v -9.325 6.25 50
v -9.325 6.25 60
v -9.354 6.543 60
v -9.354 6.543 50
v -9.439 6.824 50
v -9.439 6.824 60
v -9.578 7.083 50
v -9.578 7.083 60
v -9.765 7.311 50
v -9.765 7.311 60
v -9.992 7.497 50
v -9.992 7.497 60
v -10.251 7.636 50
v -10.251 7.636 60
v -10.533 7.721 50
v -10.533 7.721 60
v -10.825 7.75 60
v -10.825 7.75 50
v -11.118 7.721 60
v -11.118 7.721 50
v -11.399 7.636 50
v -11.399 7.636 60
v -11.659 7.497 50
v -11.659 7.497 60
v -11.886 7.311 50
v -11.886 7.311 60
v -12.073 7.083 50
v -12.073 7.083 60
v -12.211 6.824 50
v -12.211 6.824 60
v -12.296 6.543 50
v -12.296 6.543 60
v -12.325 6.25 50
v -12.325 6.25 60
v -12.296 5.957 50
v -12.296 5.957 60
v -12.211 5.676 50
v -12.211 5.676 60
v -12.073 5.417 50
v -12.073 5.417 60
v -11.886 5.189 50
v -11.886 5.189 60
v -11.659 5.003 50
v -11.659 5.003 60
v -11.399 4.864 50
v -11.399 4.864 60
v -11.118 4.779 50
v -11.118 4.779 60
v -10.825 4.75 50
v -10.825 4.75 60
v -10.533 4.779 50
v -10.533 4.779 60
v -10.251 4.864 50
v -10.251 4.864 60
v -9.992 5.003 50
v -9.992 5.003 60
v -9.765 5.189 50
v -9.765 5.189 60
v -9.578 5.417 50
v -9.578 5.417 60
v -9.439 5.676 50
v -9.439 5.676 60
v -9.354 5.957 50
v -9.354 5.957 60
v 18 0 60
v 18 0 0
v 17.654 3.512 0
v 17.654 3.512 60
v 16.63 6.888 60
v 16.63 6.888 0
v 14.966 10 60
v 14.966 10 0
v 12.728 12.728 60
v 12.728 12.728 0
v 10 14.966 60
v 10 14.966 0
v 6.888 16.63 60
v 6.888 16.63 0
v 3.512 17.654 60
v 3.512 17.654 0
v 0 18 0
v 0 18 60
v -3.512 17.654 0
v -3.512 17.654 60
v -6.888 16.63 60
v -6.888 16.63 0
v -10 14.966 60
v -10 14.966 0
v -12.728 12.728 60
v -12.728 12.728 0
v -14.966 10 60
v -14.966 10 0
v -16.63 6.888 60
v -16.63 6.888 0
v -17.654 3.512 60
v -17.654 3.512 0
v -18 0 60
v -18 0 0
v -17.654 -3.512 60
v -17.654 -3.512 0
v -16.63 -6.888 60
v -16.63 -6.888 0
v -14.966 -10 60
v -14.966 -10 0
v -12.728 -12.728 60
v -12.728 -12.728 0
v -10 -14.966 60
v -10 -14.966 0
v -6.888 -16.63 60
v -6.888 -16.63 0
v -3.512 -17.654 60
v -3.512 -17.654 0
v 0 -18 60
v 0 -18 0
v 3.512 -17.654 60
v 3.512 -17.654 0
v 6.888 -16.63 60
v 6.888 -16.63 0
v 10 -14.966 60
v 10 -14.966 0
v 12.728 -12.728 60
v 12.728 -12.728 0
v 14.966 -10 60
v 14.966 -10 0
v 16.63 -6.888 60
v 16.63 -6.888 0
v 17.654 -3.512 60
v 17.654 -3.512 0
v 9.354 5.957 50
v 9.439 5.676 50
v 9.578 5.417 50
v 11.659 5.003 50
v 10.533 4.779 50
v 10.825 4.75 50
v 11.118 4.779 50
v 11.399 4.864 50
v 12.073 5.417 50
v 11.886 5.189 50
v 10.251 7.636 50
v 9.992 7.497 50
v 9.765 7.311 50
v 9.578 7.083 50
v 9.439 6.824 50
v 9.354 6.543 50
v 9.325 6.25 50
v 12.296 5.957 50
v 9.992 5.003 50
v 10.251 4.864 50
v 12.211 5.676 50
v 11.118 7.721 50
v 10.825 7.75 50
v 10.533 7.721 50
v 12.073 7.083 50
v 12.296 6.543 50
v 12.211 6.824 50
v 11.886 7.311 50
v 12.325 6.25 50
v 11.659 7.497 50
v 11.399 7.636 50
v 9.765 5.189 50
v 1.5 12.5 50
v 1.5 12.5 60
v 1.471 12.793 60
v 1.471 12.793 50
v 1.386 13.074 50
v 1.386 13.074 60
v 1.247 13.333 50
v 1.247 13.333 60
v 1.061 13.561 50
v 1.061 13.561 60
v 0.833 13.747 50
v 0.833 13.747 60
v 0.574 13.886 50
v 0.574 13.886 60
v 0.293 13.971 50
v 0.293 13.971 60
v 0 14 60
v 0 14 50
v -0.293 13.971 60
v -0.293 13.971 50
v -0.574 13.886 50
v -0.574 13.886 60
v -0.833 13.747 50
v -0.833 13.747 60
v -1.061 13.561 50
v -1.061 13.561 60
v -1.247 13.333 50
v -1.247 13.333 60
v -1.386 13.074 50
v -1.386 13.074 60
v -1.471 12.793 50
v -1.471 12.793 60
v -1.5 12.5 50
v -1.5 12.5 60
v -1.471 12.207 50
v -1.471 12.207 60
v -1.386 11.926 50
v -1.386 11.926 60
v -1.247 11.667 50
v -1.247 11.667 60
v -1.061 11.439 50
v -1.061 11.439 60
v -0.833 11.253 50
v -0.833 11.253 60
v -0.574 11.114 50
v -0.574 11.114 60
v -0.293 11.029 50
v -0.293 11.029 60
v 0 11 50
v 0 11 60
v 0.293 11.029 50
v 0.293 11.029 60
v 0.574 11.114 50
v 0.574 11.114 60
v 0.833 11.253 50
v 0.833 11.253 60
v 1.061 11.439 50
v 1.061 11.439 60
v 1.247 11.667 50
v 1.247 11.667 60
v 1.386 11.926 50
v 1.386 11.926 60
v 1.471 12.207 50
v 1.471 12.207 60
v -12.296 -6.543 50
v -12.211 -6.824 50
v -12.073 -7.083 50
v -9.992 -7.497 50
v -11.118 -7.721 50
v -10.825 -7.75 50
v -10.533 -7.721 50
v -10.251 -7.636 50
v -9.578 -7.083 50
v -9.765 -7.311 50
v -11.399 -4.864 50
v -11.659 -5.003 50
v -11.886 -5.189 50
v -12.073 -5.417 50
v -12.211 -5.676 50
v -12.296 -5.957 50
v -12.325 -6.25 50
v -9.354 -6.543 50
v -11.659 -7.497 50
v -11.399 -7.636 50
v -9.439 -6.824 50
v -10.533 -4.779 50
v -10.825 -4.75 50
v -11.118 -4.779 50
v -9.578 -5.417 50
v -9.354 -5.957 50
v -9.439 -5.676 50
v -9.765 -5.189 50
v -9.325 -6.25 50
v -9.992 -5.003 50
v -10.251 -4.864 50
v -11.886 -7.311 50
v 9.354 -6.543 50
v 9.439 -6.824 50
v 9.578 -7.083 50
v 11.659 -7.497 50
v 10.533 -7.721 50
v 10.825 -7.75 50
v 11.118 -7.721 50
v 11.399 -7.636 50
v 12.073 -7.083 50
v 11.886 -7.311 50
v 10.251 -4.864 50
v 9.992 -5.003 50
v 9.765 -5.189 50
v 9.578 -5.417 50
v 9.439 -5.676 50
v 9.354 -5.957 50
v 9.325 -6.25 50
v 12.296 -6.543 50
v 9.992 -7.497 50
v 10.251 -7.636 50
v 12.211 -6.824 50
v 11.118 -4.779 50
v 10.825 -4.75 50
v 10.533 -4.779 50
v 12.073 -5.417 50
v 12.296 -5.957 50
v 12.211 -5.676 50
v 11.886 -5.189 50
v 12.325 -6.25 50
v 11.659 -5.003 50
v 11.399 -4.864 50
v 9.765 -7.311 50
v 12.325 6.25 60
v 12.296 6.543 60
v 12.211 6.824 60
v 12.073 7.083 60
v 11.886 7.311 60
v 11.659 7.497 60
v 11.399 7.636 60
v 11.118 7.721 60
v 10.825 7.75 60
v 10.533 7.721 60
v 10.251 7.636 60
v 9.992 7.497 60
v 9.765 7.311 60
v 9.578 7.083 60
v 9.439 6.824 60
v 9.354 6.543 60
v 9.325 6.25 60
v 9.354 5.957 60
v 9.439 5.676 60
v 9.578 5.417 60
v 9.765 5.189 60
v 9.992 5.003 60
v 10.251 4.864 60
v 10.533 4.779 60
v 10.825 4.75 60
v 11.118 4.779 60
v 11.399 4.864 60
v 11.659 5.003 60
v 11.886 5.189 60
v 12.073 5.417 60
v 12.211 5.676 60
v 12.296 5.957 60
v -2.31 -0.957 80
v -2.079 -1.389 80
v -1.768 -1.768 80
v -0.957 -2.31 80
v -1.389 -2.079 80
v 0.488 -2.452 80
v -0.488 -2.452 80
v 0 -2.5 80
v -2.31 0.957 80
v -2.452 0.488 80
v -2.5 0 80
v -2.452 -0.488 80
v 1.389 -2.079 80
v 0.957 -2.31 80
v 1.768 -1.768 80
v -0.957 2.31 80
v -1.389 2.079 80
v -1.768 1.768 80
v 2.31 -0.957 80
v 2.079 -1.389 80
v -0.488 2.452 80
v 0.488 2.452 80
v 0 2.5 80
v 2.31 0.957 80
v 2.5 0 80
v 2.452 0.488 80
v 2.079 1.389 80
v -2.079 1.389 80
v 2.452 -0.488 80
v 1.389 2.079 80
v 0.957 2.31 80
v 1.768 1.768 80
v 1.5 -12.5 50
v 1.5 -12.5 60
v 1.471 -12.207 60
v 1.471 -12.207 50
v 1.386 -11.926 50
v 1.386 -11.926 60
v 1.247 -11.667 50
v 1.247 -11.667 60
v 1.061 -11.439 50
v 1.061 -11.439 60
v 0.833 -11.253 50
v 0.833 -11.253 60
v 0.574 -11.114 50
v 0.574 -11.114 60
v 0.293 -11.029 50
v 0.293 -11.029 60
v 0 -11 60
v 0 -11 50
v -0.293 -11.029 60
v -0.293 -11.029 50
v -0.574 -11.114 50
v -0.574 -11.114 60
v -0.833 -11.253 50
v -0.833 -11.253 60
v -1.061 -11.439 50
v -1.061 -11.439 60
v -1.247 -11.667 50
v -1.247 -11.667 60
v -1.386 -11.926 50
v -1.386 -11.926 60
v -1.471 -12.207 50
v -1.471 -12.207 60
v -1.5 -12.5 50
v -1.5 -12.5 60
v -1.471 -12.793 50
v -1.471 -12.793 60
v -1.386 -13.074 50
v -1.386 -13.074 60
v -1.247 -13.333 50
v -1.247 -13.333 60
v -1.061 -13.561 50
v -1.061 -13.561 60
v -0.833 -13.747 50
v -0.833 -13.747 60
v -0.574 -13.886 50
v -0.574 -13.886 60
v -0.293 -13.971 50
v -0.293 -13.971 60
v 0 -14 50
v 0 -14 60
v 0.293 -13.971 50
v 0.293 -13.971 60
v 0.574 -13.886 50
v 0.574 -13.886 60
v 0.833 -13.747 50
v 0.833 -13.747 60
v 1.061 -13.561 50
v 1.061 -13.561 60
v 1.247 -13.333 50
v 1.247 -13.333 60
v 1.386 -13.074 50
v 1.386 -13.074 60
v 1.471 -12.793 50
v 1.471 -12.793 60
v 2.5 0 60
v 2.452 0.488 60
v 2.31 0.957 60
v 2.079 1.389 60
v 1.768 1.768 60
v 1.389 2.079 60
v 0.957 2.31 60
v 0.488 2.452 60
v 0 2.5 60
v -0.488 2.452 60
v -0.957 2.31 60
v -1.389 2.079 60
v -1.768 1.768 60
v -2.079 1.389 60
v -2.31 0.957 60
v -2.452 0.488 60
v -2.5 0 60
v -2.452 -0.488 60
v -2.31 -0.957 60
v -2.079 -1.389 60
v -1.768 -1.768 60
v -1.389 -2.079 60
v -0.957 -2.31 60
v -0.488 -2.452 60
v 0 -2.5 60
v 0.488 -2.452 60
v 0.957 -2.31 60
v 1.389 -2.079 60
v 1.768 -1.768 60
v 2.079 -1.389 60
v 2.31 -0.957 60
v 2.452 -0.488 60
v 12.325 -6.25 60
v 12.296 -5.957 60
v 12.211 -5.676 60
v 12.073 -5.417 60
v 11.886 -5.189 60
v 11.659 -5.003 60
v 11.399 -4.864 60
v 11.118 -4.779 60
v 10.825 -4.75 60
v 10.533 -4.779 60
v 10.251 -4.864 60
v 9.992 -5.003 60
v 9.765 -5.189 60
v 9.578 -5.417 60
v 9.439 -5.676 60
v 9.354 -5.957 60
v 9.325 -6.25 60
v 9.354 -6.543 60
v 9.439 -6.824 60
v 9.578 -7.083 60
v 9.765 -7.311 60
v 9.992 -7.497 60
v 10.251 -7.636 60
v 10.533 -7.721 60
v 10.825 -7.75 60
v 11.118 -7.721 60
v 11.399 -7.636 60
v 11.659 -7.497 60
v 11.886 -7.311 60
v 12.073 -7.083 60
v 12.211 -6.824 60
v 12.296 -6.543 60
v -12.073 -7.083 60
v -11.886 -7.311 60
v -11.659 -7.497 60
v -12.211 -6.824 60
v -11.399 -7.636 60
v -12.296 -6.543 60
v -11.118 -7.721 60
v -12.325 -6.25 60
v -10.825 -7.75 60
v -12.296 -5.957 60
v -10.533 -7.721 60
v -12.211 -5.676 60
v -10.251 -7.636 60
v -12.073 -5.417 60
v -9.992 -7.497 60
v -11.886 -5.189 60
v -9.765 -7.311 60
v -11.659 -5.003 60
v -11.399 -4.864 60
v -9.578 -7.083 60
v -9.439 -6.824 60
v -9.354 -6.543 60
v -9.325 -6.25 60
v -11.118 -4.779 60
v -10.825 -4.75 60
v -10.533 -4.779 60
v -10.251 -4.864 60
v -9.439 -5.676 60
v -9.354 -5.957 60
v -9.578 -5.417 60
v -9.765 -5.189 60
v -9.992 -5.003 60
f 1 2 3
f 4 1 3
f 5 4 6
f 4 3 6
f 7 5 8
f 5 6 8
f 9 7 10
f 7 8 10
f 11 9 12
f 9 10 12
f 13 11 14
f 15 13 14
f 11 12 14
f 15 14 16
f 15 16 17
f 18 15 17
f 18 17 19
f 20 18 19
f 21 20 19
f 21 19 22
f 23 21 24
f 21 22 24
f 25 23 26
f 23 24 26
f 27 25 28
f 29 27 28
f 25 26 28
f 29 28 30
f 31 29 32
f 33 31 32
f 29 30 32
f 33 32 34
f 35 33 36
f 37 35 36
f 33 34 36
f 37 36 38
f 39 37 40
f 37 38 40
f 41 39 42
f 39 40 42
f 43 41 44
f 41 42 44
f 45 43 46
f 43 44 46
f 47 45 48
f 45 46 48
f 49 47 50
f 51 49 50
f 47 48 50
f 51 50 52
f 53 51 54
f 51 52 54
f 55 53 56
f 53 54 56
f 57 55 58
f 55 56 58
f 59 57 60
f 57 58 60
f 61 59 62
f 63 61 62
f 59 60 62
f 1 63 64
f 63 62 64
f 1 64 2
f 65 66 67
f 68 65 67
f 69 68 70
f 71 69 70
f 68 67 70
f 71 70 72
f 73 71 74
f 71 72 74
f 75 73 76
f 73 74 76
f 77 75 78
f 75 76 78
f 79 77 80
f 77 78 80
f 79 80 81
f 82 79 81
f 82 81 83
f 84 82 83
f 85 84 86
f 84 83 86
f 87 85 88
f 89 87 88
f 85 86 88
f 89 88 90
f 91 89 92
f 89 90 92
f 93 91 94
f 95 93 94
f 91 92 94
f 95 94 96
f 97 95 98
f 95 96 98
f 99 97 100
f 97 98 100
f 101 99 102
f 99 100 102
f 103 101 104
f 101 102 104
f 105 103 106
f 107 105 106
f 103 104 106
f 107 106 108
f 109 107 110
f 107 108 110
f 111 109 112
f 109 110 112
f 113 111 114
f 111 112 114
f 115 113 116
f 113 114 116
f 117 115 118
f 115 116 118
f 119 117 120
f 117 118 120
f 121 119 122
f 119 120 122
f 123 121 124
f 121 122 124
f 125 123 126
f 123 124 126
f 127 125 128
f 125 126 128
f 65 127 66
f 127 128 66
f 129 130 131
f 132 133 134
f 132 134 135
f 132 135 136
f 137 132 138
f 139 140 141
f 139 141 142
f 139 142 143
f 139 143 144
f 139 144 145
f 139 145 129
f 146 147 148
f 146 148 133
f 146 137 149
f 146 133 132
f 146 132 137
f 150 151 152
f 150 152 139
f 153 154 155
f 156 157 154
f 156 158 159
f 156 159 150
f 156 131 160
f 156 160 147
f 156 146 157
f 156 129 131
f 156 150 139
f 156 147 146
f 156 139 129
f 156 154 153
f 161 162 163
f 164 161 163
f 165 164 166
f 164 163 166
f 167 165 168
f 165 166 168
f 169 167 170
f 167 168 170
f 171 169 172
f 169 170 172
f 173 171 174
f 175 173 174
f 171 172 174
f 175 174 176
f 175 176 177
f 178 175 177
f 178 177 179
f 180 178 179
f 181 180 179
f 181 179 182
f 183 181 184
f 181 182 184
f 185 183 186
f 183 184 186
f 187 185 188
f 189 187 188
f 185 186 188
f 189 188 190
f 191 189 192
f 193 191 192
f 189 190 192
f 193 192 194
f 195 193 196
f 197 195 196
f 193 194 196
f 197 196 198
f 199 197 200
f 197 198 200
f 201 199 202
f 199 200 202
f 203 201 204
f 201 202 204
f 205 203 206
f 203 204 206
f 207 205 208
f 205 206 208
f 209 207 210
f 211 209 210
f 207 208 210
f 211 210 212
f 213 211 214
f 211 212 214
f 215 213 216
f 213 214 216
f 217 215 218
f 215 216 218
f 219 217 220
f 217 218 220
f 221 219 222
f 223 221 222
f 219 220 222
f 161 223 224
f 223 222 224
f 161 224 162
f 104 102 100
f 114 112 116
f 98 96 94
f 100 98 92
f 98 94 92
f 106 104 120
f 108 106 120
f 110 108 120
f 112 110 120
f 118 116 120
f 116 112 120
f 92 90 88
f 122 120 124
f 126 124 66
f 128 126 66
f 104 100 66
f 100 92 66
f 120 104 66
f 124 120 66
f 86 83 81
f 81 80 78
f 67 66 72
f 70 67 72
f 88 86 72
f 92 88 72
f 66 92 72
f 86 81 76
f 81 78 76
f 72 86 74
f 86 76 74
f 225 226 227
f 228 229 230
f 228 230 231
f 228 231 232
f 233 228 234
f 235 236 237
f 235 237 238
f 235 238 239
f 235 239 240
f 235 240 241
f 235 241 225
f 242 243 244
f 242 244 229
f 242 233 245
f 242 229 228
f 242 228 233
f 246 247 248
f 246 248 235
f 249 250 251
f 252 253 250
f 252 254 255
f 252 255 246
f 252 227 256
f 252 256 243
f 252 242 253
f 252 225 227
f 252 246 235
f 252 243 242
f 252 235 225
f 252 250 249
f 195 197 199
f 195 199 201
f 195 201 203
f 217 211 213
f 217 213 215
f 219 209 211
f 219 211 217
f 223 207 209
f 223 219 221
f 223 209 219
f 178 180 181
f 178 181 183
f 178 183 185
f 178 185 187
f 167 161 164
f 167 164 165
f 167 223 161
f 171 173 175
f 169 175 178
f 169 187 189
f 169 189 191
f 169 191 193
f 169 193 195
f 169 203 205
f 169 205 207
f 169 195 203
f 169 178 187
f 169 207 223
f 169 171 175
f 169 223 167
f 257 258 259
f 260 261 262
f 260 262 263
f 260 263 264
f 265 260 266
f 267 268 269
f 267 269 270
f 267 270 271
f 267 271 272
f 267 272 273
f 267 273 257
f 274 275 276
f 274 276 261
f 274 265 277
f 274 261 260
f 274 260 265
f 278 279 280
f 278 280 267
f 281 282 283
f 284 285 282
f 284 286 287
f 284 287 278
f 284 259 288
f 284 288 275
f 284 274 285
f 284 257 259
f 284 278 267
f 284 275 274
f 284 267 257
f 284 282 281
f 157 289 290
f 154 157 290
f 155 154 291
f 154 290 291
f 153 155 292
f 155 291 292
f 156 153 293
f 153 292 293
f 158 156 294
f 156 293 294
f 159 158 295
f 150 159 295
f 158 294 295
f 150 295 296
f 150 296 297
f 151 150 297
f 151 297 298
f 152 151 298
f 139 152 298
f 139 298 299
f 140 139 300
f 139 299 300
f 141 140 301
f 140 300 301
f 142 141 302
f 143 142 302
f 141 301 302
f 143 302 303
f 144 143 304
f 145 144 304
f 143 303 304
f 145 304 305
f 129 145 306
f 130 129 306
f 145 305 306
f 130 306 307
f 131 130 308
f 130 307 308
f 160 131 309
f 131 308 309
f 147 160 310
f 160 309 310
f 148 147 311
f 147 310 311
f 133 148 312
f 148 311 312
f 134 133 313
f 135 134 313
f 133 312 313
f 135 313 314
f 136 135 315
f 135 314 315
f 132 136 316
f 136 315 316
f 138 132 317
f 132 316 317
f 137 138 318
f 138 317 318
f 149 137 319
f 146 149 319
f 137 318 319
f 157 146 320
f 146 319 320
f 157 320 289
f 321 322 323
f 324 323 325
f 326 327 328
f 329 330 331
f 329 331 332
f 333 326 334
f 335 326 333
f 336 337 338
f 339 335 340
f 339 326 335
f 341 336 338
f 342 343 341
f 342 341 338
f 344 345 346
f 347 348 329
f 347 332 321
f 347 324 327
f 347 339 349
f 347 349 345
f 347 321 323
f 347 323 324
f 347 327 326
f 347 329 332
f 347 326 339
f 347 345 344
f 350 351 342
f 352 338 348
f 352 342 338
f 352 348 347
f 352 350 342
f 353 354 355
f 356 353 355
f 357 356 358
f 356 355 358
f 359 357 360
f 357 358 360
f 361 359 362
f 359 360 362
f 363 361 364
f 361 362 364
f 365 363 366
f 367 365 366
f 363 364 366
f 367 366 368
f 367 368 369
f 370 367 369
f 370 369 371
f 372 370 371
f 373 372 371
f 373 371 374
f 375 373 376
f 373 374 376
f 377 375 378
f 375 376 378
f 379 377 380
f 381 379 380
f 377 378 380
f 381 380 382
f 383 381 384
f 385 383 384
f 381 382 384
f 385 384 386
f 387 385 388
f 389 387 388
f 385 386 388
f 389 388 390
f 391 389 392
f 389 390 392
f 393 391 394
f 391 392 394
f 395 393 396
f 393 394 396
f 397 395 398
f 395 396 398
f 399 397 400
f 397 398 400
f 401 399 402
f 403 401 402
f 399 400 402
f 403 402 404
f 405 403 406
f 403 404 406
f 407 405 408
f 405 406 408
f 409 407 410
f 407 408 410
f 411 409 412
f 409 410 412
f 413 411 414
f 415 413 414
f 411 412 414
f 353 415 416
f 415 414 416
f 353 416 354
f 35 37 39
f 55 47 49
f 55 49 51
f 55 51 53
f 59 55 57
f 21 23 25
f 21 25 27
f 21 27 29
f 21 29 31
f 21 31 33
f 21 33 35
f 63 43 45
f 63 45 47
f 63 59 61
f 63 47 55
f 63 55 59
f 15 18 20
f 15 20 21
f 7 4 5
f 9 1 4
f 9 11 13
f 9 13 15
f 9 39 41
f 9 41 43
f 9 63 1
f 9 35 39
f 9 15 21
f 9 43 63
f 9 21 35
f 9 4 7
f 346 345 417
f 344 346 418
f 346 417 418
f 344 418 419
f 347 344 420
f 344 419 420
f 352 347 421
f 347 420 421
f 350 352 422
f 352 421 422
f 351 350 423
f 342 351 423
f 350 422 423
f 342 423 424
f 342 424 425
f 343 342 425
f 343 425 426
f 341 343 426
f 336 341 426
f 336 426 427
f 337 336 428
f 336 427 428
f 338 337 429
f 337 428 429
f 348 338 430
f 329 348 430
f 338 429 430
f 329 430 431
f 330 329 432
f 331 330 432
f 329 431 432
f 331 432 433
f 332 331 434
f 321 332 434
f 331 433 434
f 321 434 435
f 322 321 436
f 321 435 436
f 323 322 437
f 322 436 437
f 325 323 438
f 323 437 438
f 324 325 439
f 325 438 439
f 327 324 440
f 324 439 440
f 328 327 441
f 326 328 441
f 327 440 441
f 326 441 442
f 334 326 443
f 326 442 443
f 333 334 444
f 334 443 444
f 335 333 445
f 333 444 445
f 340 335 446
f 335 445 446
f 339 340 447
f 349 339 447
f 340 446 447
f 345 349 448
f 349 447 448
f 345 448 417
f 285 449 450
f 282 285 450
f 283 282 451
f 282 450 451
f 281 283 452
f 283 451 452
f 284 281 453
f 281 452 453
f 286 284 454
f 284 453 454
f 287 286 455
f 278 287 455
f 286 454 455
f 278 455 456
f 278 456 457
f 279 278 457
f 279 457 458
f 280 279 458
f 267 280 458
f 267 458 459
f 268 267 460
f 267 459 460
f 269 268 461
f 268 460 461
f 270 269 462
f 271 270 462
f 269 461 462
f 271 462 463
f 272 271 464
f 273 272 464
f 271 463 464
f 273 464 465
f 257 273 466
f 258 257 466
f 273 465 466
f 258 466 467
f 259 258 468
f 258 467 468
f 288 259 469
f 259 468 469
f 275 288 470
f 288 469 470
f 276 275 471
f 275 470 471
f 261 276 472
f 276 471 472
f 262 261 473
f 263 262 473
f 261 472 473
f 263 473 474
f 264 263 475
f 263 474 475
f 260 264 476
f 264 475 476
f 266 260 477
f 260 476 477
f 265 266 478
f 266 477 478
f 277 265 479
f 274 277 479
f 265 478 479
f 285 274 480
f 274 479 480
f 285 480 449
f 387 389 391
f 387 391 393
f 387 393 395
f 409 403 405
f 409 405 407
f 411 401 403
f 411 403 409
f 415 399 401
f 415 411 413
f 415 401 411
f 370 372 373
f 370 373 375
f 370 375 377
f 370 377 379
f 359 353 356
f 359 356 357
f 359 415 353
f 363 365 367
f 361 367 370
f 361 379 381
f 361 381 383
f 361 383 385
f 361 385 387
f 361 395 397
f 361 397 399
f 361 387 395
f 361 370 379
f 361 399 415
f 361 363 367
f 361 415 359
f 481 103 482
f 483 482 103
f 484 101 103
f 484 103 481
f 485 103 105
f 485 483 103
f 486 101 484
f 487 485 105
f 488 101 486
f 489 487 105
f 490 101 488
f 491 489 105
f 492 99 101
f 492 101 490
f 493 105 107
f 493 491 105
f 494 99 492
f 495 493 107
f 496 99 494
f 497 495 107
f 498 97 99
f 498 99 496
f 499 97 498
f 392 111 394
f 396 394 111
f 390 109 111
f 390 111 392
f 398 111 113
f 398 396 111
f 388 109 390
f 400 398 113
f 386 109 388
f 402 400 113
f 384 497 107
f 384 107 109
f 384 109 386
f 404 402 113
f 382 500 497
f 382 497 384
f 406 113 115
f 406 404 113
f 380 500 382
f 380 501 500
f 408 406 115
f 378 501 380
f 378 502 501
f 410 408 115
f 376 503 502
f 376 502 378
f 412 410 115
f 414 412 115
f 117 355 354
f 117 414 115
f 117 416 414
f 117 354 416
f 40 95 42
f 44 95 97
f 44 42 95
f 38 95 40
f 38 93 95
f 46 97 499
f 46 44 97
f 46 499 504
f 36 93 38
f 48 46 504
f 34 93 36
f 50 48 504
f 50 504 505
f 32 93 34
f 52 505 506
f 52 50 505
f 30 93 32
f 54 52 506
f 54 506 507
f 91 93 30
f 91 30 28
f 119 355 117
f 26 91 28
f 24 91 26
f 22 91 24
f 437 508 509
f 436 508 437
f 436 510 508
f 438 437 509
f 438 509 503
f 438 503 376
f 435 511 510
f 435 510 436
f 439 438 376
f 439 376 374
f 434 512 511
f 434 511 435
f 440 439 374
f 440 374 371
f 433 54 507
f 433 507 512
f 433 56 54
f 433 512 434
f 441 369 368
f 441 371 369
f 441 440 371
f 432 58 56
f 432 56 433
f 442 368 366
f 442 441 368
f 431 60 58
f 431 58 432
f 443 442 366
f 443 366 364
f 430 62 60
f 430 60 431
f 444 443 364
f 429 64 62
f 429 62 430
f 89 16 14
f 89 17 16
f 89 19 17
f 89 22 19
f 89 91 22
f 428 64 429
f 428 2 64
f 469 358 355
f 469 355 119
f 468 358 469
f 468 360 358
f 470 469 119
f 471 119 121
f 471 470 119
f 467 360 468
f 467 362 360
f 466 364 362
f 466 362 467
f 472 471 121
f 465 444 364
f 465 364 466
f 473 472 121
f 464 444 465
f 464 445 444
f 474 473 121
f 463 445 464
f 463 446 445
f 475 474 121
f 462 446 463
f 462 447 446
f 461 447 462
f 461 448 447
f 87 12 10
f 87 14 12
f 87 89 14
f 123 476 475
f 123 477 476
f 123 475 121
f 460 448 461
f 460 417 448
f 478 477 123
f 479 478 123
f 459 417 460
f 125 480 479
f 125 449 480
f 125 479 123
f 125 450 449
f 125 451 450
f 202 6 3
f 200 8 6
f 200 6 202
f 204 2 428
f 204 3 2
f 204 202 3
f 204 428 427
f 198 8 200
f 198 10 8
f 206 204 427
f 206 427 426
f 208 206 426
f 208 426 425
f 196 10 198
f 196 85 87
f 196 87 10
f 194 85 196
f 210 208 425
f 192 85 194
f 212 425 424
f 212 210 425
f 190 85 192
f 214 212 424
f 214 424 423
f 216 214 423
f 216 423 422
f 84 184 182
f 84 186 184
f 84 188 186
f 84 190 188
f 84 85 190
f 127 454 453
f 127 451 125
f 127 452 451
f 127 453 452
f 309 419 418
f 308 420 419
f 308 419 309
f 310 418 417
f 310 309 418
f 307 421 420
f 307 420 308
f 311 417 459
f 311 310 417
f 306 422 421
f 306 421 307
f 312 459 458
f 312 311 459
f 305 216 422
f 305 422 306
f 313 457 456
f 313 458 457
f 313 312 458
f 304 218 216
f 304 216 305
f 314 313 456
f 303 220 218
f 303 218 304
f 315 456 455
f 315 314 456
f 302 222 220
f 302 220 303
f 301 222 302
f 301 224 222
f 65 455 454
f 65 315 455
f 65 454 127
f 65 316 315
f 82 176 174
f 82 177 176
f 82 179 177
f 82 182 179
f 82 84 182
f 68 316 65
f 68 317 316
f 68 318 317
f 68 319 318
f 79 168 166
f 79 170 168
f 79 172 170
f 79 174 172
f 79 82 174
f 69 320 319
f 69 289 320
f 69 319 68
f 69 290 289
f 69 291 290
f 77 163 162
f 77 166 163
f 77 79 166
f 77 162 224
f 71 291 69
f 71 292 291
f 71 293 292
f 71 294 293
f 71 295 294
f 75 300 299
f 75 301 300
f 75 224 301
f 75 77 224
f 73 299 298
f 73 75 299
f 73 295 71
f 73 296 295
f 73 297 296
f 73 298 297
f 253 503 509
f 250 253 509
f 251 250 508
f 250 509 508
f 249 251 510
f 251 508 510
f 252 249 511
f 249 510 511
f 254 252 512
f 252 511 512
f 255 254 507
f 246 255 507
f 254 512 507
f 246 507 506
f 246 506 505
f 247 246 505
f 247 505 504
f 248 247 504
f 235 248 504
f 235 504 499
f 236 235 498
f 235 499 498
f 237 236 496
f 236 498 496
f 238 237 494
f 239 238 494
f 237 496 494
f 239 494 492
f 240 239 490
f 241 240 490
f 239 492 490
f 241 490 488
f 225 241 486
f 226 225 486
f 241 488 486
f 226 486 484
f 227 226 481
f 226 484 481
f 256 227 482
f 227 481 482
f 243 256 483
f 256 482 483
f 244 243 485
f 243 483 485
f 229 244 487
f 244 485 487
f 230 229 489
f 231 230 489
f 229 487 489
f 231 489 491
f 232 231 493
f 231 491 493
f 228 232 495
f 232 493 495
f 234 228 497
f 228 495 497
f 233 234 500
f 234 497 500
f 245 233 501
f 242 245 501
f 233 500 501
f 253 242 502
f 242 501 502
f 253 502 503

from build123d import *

# Parameters (mm, degrees)
SKETCH1_R           = 18
BOSS_EXTRUDE1_DEPTH = 60
SKETCH2_R           = 2.5
BOSS_EXTRUDE2_DEPTH = 20
SKETCH3_R           = 1.5
CUT_EXTRUDE1_DEPTH  = 10


with BuildPart() as part:
    # Sketch1 → Boss-Extrude1 (new body)
    with BuildSketch(Plane.XY):
        Circle(SKETCH1_R)
    extrude(amount=BOSS_EXTRUDE1_DEPTH)

    # Sketch2 → Boss-Extrude2 (add)
    with BuildSketch(Plane.XY.offset(60)):
        Circle(SKETCH2_R)
    extrude(amount=BOSS_EXTRUDE2_DEPTH)

    # Sketch3 → Cut-Extrude1 (cut)
    with BuildSketch(Plane.XY.offset(60)):
        with Locations((0, 12.5)):
            Circle(SKETCH3_R)
        with Locations((10.825317547, 6.25)):
            Circle(SKETCH3_R)
        with Locations((10.825317547, -6.25)):
            Circle(SKETCH3_R)
        with Locations((0, -12.5)):
            Circle(SKETCH3_R)
        with Locations((-10.825317547, -6.25)):
            Circle(SKETCH3_R)
        with Locations((-10.825317547, 6.25)):
            Circle(SKETCH3_R)
    extrude(amount=-CUT_EXTRUDE1_DEPTH, mode=Mode.SUBTRACT)


solid = part.part
